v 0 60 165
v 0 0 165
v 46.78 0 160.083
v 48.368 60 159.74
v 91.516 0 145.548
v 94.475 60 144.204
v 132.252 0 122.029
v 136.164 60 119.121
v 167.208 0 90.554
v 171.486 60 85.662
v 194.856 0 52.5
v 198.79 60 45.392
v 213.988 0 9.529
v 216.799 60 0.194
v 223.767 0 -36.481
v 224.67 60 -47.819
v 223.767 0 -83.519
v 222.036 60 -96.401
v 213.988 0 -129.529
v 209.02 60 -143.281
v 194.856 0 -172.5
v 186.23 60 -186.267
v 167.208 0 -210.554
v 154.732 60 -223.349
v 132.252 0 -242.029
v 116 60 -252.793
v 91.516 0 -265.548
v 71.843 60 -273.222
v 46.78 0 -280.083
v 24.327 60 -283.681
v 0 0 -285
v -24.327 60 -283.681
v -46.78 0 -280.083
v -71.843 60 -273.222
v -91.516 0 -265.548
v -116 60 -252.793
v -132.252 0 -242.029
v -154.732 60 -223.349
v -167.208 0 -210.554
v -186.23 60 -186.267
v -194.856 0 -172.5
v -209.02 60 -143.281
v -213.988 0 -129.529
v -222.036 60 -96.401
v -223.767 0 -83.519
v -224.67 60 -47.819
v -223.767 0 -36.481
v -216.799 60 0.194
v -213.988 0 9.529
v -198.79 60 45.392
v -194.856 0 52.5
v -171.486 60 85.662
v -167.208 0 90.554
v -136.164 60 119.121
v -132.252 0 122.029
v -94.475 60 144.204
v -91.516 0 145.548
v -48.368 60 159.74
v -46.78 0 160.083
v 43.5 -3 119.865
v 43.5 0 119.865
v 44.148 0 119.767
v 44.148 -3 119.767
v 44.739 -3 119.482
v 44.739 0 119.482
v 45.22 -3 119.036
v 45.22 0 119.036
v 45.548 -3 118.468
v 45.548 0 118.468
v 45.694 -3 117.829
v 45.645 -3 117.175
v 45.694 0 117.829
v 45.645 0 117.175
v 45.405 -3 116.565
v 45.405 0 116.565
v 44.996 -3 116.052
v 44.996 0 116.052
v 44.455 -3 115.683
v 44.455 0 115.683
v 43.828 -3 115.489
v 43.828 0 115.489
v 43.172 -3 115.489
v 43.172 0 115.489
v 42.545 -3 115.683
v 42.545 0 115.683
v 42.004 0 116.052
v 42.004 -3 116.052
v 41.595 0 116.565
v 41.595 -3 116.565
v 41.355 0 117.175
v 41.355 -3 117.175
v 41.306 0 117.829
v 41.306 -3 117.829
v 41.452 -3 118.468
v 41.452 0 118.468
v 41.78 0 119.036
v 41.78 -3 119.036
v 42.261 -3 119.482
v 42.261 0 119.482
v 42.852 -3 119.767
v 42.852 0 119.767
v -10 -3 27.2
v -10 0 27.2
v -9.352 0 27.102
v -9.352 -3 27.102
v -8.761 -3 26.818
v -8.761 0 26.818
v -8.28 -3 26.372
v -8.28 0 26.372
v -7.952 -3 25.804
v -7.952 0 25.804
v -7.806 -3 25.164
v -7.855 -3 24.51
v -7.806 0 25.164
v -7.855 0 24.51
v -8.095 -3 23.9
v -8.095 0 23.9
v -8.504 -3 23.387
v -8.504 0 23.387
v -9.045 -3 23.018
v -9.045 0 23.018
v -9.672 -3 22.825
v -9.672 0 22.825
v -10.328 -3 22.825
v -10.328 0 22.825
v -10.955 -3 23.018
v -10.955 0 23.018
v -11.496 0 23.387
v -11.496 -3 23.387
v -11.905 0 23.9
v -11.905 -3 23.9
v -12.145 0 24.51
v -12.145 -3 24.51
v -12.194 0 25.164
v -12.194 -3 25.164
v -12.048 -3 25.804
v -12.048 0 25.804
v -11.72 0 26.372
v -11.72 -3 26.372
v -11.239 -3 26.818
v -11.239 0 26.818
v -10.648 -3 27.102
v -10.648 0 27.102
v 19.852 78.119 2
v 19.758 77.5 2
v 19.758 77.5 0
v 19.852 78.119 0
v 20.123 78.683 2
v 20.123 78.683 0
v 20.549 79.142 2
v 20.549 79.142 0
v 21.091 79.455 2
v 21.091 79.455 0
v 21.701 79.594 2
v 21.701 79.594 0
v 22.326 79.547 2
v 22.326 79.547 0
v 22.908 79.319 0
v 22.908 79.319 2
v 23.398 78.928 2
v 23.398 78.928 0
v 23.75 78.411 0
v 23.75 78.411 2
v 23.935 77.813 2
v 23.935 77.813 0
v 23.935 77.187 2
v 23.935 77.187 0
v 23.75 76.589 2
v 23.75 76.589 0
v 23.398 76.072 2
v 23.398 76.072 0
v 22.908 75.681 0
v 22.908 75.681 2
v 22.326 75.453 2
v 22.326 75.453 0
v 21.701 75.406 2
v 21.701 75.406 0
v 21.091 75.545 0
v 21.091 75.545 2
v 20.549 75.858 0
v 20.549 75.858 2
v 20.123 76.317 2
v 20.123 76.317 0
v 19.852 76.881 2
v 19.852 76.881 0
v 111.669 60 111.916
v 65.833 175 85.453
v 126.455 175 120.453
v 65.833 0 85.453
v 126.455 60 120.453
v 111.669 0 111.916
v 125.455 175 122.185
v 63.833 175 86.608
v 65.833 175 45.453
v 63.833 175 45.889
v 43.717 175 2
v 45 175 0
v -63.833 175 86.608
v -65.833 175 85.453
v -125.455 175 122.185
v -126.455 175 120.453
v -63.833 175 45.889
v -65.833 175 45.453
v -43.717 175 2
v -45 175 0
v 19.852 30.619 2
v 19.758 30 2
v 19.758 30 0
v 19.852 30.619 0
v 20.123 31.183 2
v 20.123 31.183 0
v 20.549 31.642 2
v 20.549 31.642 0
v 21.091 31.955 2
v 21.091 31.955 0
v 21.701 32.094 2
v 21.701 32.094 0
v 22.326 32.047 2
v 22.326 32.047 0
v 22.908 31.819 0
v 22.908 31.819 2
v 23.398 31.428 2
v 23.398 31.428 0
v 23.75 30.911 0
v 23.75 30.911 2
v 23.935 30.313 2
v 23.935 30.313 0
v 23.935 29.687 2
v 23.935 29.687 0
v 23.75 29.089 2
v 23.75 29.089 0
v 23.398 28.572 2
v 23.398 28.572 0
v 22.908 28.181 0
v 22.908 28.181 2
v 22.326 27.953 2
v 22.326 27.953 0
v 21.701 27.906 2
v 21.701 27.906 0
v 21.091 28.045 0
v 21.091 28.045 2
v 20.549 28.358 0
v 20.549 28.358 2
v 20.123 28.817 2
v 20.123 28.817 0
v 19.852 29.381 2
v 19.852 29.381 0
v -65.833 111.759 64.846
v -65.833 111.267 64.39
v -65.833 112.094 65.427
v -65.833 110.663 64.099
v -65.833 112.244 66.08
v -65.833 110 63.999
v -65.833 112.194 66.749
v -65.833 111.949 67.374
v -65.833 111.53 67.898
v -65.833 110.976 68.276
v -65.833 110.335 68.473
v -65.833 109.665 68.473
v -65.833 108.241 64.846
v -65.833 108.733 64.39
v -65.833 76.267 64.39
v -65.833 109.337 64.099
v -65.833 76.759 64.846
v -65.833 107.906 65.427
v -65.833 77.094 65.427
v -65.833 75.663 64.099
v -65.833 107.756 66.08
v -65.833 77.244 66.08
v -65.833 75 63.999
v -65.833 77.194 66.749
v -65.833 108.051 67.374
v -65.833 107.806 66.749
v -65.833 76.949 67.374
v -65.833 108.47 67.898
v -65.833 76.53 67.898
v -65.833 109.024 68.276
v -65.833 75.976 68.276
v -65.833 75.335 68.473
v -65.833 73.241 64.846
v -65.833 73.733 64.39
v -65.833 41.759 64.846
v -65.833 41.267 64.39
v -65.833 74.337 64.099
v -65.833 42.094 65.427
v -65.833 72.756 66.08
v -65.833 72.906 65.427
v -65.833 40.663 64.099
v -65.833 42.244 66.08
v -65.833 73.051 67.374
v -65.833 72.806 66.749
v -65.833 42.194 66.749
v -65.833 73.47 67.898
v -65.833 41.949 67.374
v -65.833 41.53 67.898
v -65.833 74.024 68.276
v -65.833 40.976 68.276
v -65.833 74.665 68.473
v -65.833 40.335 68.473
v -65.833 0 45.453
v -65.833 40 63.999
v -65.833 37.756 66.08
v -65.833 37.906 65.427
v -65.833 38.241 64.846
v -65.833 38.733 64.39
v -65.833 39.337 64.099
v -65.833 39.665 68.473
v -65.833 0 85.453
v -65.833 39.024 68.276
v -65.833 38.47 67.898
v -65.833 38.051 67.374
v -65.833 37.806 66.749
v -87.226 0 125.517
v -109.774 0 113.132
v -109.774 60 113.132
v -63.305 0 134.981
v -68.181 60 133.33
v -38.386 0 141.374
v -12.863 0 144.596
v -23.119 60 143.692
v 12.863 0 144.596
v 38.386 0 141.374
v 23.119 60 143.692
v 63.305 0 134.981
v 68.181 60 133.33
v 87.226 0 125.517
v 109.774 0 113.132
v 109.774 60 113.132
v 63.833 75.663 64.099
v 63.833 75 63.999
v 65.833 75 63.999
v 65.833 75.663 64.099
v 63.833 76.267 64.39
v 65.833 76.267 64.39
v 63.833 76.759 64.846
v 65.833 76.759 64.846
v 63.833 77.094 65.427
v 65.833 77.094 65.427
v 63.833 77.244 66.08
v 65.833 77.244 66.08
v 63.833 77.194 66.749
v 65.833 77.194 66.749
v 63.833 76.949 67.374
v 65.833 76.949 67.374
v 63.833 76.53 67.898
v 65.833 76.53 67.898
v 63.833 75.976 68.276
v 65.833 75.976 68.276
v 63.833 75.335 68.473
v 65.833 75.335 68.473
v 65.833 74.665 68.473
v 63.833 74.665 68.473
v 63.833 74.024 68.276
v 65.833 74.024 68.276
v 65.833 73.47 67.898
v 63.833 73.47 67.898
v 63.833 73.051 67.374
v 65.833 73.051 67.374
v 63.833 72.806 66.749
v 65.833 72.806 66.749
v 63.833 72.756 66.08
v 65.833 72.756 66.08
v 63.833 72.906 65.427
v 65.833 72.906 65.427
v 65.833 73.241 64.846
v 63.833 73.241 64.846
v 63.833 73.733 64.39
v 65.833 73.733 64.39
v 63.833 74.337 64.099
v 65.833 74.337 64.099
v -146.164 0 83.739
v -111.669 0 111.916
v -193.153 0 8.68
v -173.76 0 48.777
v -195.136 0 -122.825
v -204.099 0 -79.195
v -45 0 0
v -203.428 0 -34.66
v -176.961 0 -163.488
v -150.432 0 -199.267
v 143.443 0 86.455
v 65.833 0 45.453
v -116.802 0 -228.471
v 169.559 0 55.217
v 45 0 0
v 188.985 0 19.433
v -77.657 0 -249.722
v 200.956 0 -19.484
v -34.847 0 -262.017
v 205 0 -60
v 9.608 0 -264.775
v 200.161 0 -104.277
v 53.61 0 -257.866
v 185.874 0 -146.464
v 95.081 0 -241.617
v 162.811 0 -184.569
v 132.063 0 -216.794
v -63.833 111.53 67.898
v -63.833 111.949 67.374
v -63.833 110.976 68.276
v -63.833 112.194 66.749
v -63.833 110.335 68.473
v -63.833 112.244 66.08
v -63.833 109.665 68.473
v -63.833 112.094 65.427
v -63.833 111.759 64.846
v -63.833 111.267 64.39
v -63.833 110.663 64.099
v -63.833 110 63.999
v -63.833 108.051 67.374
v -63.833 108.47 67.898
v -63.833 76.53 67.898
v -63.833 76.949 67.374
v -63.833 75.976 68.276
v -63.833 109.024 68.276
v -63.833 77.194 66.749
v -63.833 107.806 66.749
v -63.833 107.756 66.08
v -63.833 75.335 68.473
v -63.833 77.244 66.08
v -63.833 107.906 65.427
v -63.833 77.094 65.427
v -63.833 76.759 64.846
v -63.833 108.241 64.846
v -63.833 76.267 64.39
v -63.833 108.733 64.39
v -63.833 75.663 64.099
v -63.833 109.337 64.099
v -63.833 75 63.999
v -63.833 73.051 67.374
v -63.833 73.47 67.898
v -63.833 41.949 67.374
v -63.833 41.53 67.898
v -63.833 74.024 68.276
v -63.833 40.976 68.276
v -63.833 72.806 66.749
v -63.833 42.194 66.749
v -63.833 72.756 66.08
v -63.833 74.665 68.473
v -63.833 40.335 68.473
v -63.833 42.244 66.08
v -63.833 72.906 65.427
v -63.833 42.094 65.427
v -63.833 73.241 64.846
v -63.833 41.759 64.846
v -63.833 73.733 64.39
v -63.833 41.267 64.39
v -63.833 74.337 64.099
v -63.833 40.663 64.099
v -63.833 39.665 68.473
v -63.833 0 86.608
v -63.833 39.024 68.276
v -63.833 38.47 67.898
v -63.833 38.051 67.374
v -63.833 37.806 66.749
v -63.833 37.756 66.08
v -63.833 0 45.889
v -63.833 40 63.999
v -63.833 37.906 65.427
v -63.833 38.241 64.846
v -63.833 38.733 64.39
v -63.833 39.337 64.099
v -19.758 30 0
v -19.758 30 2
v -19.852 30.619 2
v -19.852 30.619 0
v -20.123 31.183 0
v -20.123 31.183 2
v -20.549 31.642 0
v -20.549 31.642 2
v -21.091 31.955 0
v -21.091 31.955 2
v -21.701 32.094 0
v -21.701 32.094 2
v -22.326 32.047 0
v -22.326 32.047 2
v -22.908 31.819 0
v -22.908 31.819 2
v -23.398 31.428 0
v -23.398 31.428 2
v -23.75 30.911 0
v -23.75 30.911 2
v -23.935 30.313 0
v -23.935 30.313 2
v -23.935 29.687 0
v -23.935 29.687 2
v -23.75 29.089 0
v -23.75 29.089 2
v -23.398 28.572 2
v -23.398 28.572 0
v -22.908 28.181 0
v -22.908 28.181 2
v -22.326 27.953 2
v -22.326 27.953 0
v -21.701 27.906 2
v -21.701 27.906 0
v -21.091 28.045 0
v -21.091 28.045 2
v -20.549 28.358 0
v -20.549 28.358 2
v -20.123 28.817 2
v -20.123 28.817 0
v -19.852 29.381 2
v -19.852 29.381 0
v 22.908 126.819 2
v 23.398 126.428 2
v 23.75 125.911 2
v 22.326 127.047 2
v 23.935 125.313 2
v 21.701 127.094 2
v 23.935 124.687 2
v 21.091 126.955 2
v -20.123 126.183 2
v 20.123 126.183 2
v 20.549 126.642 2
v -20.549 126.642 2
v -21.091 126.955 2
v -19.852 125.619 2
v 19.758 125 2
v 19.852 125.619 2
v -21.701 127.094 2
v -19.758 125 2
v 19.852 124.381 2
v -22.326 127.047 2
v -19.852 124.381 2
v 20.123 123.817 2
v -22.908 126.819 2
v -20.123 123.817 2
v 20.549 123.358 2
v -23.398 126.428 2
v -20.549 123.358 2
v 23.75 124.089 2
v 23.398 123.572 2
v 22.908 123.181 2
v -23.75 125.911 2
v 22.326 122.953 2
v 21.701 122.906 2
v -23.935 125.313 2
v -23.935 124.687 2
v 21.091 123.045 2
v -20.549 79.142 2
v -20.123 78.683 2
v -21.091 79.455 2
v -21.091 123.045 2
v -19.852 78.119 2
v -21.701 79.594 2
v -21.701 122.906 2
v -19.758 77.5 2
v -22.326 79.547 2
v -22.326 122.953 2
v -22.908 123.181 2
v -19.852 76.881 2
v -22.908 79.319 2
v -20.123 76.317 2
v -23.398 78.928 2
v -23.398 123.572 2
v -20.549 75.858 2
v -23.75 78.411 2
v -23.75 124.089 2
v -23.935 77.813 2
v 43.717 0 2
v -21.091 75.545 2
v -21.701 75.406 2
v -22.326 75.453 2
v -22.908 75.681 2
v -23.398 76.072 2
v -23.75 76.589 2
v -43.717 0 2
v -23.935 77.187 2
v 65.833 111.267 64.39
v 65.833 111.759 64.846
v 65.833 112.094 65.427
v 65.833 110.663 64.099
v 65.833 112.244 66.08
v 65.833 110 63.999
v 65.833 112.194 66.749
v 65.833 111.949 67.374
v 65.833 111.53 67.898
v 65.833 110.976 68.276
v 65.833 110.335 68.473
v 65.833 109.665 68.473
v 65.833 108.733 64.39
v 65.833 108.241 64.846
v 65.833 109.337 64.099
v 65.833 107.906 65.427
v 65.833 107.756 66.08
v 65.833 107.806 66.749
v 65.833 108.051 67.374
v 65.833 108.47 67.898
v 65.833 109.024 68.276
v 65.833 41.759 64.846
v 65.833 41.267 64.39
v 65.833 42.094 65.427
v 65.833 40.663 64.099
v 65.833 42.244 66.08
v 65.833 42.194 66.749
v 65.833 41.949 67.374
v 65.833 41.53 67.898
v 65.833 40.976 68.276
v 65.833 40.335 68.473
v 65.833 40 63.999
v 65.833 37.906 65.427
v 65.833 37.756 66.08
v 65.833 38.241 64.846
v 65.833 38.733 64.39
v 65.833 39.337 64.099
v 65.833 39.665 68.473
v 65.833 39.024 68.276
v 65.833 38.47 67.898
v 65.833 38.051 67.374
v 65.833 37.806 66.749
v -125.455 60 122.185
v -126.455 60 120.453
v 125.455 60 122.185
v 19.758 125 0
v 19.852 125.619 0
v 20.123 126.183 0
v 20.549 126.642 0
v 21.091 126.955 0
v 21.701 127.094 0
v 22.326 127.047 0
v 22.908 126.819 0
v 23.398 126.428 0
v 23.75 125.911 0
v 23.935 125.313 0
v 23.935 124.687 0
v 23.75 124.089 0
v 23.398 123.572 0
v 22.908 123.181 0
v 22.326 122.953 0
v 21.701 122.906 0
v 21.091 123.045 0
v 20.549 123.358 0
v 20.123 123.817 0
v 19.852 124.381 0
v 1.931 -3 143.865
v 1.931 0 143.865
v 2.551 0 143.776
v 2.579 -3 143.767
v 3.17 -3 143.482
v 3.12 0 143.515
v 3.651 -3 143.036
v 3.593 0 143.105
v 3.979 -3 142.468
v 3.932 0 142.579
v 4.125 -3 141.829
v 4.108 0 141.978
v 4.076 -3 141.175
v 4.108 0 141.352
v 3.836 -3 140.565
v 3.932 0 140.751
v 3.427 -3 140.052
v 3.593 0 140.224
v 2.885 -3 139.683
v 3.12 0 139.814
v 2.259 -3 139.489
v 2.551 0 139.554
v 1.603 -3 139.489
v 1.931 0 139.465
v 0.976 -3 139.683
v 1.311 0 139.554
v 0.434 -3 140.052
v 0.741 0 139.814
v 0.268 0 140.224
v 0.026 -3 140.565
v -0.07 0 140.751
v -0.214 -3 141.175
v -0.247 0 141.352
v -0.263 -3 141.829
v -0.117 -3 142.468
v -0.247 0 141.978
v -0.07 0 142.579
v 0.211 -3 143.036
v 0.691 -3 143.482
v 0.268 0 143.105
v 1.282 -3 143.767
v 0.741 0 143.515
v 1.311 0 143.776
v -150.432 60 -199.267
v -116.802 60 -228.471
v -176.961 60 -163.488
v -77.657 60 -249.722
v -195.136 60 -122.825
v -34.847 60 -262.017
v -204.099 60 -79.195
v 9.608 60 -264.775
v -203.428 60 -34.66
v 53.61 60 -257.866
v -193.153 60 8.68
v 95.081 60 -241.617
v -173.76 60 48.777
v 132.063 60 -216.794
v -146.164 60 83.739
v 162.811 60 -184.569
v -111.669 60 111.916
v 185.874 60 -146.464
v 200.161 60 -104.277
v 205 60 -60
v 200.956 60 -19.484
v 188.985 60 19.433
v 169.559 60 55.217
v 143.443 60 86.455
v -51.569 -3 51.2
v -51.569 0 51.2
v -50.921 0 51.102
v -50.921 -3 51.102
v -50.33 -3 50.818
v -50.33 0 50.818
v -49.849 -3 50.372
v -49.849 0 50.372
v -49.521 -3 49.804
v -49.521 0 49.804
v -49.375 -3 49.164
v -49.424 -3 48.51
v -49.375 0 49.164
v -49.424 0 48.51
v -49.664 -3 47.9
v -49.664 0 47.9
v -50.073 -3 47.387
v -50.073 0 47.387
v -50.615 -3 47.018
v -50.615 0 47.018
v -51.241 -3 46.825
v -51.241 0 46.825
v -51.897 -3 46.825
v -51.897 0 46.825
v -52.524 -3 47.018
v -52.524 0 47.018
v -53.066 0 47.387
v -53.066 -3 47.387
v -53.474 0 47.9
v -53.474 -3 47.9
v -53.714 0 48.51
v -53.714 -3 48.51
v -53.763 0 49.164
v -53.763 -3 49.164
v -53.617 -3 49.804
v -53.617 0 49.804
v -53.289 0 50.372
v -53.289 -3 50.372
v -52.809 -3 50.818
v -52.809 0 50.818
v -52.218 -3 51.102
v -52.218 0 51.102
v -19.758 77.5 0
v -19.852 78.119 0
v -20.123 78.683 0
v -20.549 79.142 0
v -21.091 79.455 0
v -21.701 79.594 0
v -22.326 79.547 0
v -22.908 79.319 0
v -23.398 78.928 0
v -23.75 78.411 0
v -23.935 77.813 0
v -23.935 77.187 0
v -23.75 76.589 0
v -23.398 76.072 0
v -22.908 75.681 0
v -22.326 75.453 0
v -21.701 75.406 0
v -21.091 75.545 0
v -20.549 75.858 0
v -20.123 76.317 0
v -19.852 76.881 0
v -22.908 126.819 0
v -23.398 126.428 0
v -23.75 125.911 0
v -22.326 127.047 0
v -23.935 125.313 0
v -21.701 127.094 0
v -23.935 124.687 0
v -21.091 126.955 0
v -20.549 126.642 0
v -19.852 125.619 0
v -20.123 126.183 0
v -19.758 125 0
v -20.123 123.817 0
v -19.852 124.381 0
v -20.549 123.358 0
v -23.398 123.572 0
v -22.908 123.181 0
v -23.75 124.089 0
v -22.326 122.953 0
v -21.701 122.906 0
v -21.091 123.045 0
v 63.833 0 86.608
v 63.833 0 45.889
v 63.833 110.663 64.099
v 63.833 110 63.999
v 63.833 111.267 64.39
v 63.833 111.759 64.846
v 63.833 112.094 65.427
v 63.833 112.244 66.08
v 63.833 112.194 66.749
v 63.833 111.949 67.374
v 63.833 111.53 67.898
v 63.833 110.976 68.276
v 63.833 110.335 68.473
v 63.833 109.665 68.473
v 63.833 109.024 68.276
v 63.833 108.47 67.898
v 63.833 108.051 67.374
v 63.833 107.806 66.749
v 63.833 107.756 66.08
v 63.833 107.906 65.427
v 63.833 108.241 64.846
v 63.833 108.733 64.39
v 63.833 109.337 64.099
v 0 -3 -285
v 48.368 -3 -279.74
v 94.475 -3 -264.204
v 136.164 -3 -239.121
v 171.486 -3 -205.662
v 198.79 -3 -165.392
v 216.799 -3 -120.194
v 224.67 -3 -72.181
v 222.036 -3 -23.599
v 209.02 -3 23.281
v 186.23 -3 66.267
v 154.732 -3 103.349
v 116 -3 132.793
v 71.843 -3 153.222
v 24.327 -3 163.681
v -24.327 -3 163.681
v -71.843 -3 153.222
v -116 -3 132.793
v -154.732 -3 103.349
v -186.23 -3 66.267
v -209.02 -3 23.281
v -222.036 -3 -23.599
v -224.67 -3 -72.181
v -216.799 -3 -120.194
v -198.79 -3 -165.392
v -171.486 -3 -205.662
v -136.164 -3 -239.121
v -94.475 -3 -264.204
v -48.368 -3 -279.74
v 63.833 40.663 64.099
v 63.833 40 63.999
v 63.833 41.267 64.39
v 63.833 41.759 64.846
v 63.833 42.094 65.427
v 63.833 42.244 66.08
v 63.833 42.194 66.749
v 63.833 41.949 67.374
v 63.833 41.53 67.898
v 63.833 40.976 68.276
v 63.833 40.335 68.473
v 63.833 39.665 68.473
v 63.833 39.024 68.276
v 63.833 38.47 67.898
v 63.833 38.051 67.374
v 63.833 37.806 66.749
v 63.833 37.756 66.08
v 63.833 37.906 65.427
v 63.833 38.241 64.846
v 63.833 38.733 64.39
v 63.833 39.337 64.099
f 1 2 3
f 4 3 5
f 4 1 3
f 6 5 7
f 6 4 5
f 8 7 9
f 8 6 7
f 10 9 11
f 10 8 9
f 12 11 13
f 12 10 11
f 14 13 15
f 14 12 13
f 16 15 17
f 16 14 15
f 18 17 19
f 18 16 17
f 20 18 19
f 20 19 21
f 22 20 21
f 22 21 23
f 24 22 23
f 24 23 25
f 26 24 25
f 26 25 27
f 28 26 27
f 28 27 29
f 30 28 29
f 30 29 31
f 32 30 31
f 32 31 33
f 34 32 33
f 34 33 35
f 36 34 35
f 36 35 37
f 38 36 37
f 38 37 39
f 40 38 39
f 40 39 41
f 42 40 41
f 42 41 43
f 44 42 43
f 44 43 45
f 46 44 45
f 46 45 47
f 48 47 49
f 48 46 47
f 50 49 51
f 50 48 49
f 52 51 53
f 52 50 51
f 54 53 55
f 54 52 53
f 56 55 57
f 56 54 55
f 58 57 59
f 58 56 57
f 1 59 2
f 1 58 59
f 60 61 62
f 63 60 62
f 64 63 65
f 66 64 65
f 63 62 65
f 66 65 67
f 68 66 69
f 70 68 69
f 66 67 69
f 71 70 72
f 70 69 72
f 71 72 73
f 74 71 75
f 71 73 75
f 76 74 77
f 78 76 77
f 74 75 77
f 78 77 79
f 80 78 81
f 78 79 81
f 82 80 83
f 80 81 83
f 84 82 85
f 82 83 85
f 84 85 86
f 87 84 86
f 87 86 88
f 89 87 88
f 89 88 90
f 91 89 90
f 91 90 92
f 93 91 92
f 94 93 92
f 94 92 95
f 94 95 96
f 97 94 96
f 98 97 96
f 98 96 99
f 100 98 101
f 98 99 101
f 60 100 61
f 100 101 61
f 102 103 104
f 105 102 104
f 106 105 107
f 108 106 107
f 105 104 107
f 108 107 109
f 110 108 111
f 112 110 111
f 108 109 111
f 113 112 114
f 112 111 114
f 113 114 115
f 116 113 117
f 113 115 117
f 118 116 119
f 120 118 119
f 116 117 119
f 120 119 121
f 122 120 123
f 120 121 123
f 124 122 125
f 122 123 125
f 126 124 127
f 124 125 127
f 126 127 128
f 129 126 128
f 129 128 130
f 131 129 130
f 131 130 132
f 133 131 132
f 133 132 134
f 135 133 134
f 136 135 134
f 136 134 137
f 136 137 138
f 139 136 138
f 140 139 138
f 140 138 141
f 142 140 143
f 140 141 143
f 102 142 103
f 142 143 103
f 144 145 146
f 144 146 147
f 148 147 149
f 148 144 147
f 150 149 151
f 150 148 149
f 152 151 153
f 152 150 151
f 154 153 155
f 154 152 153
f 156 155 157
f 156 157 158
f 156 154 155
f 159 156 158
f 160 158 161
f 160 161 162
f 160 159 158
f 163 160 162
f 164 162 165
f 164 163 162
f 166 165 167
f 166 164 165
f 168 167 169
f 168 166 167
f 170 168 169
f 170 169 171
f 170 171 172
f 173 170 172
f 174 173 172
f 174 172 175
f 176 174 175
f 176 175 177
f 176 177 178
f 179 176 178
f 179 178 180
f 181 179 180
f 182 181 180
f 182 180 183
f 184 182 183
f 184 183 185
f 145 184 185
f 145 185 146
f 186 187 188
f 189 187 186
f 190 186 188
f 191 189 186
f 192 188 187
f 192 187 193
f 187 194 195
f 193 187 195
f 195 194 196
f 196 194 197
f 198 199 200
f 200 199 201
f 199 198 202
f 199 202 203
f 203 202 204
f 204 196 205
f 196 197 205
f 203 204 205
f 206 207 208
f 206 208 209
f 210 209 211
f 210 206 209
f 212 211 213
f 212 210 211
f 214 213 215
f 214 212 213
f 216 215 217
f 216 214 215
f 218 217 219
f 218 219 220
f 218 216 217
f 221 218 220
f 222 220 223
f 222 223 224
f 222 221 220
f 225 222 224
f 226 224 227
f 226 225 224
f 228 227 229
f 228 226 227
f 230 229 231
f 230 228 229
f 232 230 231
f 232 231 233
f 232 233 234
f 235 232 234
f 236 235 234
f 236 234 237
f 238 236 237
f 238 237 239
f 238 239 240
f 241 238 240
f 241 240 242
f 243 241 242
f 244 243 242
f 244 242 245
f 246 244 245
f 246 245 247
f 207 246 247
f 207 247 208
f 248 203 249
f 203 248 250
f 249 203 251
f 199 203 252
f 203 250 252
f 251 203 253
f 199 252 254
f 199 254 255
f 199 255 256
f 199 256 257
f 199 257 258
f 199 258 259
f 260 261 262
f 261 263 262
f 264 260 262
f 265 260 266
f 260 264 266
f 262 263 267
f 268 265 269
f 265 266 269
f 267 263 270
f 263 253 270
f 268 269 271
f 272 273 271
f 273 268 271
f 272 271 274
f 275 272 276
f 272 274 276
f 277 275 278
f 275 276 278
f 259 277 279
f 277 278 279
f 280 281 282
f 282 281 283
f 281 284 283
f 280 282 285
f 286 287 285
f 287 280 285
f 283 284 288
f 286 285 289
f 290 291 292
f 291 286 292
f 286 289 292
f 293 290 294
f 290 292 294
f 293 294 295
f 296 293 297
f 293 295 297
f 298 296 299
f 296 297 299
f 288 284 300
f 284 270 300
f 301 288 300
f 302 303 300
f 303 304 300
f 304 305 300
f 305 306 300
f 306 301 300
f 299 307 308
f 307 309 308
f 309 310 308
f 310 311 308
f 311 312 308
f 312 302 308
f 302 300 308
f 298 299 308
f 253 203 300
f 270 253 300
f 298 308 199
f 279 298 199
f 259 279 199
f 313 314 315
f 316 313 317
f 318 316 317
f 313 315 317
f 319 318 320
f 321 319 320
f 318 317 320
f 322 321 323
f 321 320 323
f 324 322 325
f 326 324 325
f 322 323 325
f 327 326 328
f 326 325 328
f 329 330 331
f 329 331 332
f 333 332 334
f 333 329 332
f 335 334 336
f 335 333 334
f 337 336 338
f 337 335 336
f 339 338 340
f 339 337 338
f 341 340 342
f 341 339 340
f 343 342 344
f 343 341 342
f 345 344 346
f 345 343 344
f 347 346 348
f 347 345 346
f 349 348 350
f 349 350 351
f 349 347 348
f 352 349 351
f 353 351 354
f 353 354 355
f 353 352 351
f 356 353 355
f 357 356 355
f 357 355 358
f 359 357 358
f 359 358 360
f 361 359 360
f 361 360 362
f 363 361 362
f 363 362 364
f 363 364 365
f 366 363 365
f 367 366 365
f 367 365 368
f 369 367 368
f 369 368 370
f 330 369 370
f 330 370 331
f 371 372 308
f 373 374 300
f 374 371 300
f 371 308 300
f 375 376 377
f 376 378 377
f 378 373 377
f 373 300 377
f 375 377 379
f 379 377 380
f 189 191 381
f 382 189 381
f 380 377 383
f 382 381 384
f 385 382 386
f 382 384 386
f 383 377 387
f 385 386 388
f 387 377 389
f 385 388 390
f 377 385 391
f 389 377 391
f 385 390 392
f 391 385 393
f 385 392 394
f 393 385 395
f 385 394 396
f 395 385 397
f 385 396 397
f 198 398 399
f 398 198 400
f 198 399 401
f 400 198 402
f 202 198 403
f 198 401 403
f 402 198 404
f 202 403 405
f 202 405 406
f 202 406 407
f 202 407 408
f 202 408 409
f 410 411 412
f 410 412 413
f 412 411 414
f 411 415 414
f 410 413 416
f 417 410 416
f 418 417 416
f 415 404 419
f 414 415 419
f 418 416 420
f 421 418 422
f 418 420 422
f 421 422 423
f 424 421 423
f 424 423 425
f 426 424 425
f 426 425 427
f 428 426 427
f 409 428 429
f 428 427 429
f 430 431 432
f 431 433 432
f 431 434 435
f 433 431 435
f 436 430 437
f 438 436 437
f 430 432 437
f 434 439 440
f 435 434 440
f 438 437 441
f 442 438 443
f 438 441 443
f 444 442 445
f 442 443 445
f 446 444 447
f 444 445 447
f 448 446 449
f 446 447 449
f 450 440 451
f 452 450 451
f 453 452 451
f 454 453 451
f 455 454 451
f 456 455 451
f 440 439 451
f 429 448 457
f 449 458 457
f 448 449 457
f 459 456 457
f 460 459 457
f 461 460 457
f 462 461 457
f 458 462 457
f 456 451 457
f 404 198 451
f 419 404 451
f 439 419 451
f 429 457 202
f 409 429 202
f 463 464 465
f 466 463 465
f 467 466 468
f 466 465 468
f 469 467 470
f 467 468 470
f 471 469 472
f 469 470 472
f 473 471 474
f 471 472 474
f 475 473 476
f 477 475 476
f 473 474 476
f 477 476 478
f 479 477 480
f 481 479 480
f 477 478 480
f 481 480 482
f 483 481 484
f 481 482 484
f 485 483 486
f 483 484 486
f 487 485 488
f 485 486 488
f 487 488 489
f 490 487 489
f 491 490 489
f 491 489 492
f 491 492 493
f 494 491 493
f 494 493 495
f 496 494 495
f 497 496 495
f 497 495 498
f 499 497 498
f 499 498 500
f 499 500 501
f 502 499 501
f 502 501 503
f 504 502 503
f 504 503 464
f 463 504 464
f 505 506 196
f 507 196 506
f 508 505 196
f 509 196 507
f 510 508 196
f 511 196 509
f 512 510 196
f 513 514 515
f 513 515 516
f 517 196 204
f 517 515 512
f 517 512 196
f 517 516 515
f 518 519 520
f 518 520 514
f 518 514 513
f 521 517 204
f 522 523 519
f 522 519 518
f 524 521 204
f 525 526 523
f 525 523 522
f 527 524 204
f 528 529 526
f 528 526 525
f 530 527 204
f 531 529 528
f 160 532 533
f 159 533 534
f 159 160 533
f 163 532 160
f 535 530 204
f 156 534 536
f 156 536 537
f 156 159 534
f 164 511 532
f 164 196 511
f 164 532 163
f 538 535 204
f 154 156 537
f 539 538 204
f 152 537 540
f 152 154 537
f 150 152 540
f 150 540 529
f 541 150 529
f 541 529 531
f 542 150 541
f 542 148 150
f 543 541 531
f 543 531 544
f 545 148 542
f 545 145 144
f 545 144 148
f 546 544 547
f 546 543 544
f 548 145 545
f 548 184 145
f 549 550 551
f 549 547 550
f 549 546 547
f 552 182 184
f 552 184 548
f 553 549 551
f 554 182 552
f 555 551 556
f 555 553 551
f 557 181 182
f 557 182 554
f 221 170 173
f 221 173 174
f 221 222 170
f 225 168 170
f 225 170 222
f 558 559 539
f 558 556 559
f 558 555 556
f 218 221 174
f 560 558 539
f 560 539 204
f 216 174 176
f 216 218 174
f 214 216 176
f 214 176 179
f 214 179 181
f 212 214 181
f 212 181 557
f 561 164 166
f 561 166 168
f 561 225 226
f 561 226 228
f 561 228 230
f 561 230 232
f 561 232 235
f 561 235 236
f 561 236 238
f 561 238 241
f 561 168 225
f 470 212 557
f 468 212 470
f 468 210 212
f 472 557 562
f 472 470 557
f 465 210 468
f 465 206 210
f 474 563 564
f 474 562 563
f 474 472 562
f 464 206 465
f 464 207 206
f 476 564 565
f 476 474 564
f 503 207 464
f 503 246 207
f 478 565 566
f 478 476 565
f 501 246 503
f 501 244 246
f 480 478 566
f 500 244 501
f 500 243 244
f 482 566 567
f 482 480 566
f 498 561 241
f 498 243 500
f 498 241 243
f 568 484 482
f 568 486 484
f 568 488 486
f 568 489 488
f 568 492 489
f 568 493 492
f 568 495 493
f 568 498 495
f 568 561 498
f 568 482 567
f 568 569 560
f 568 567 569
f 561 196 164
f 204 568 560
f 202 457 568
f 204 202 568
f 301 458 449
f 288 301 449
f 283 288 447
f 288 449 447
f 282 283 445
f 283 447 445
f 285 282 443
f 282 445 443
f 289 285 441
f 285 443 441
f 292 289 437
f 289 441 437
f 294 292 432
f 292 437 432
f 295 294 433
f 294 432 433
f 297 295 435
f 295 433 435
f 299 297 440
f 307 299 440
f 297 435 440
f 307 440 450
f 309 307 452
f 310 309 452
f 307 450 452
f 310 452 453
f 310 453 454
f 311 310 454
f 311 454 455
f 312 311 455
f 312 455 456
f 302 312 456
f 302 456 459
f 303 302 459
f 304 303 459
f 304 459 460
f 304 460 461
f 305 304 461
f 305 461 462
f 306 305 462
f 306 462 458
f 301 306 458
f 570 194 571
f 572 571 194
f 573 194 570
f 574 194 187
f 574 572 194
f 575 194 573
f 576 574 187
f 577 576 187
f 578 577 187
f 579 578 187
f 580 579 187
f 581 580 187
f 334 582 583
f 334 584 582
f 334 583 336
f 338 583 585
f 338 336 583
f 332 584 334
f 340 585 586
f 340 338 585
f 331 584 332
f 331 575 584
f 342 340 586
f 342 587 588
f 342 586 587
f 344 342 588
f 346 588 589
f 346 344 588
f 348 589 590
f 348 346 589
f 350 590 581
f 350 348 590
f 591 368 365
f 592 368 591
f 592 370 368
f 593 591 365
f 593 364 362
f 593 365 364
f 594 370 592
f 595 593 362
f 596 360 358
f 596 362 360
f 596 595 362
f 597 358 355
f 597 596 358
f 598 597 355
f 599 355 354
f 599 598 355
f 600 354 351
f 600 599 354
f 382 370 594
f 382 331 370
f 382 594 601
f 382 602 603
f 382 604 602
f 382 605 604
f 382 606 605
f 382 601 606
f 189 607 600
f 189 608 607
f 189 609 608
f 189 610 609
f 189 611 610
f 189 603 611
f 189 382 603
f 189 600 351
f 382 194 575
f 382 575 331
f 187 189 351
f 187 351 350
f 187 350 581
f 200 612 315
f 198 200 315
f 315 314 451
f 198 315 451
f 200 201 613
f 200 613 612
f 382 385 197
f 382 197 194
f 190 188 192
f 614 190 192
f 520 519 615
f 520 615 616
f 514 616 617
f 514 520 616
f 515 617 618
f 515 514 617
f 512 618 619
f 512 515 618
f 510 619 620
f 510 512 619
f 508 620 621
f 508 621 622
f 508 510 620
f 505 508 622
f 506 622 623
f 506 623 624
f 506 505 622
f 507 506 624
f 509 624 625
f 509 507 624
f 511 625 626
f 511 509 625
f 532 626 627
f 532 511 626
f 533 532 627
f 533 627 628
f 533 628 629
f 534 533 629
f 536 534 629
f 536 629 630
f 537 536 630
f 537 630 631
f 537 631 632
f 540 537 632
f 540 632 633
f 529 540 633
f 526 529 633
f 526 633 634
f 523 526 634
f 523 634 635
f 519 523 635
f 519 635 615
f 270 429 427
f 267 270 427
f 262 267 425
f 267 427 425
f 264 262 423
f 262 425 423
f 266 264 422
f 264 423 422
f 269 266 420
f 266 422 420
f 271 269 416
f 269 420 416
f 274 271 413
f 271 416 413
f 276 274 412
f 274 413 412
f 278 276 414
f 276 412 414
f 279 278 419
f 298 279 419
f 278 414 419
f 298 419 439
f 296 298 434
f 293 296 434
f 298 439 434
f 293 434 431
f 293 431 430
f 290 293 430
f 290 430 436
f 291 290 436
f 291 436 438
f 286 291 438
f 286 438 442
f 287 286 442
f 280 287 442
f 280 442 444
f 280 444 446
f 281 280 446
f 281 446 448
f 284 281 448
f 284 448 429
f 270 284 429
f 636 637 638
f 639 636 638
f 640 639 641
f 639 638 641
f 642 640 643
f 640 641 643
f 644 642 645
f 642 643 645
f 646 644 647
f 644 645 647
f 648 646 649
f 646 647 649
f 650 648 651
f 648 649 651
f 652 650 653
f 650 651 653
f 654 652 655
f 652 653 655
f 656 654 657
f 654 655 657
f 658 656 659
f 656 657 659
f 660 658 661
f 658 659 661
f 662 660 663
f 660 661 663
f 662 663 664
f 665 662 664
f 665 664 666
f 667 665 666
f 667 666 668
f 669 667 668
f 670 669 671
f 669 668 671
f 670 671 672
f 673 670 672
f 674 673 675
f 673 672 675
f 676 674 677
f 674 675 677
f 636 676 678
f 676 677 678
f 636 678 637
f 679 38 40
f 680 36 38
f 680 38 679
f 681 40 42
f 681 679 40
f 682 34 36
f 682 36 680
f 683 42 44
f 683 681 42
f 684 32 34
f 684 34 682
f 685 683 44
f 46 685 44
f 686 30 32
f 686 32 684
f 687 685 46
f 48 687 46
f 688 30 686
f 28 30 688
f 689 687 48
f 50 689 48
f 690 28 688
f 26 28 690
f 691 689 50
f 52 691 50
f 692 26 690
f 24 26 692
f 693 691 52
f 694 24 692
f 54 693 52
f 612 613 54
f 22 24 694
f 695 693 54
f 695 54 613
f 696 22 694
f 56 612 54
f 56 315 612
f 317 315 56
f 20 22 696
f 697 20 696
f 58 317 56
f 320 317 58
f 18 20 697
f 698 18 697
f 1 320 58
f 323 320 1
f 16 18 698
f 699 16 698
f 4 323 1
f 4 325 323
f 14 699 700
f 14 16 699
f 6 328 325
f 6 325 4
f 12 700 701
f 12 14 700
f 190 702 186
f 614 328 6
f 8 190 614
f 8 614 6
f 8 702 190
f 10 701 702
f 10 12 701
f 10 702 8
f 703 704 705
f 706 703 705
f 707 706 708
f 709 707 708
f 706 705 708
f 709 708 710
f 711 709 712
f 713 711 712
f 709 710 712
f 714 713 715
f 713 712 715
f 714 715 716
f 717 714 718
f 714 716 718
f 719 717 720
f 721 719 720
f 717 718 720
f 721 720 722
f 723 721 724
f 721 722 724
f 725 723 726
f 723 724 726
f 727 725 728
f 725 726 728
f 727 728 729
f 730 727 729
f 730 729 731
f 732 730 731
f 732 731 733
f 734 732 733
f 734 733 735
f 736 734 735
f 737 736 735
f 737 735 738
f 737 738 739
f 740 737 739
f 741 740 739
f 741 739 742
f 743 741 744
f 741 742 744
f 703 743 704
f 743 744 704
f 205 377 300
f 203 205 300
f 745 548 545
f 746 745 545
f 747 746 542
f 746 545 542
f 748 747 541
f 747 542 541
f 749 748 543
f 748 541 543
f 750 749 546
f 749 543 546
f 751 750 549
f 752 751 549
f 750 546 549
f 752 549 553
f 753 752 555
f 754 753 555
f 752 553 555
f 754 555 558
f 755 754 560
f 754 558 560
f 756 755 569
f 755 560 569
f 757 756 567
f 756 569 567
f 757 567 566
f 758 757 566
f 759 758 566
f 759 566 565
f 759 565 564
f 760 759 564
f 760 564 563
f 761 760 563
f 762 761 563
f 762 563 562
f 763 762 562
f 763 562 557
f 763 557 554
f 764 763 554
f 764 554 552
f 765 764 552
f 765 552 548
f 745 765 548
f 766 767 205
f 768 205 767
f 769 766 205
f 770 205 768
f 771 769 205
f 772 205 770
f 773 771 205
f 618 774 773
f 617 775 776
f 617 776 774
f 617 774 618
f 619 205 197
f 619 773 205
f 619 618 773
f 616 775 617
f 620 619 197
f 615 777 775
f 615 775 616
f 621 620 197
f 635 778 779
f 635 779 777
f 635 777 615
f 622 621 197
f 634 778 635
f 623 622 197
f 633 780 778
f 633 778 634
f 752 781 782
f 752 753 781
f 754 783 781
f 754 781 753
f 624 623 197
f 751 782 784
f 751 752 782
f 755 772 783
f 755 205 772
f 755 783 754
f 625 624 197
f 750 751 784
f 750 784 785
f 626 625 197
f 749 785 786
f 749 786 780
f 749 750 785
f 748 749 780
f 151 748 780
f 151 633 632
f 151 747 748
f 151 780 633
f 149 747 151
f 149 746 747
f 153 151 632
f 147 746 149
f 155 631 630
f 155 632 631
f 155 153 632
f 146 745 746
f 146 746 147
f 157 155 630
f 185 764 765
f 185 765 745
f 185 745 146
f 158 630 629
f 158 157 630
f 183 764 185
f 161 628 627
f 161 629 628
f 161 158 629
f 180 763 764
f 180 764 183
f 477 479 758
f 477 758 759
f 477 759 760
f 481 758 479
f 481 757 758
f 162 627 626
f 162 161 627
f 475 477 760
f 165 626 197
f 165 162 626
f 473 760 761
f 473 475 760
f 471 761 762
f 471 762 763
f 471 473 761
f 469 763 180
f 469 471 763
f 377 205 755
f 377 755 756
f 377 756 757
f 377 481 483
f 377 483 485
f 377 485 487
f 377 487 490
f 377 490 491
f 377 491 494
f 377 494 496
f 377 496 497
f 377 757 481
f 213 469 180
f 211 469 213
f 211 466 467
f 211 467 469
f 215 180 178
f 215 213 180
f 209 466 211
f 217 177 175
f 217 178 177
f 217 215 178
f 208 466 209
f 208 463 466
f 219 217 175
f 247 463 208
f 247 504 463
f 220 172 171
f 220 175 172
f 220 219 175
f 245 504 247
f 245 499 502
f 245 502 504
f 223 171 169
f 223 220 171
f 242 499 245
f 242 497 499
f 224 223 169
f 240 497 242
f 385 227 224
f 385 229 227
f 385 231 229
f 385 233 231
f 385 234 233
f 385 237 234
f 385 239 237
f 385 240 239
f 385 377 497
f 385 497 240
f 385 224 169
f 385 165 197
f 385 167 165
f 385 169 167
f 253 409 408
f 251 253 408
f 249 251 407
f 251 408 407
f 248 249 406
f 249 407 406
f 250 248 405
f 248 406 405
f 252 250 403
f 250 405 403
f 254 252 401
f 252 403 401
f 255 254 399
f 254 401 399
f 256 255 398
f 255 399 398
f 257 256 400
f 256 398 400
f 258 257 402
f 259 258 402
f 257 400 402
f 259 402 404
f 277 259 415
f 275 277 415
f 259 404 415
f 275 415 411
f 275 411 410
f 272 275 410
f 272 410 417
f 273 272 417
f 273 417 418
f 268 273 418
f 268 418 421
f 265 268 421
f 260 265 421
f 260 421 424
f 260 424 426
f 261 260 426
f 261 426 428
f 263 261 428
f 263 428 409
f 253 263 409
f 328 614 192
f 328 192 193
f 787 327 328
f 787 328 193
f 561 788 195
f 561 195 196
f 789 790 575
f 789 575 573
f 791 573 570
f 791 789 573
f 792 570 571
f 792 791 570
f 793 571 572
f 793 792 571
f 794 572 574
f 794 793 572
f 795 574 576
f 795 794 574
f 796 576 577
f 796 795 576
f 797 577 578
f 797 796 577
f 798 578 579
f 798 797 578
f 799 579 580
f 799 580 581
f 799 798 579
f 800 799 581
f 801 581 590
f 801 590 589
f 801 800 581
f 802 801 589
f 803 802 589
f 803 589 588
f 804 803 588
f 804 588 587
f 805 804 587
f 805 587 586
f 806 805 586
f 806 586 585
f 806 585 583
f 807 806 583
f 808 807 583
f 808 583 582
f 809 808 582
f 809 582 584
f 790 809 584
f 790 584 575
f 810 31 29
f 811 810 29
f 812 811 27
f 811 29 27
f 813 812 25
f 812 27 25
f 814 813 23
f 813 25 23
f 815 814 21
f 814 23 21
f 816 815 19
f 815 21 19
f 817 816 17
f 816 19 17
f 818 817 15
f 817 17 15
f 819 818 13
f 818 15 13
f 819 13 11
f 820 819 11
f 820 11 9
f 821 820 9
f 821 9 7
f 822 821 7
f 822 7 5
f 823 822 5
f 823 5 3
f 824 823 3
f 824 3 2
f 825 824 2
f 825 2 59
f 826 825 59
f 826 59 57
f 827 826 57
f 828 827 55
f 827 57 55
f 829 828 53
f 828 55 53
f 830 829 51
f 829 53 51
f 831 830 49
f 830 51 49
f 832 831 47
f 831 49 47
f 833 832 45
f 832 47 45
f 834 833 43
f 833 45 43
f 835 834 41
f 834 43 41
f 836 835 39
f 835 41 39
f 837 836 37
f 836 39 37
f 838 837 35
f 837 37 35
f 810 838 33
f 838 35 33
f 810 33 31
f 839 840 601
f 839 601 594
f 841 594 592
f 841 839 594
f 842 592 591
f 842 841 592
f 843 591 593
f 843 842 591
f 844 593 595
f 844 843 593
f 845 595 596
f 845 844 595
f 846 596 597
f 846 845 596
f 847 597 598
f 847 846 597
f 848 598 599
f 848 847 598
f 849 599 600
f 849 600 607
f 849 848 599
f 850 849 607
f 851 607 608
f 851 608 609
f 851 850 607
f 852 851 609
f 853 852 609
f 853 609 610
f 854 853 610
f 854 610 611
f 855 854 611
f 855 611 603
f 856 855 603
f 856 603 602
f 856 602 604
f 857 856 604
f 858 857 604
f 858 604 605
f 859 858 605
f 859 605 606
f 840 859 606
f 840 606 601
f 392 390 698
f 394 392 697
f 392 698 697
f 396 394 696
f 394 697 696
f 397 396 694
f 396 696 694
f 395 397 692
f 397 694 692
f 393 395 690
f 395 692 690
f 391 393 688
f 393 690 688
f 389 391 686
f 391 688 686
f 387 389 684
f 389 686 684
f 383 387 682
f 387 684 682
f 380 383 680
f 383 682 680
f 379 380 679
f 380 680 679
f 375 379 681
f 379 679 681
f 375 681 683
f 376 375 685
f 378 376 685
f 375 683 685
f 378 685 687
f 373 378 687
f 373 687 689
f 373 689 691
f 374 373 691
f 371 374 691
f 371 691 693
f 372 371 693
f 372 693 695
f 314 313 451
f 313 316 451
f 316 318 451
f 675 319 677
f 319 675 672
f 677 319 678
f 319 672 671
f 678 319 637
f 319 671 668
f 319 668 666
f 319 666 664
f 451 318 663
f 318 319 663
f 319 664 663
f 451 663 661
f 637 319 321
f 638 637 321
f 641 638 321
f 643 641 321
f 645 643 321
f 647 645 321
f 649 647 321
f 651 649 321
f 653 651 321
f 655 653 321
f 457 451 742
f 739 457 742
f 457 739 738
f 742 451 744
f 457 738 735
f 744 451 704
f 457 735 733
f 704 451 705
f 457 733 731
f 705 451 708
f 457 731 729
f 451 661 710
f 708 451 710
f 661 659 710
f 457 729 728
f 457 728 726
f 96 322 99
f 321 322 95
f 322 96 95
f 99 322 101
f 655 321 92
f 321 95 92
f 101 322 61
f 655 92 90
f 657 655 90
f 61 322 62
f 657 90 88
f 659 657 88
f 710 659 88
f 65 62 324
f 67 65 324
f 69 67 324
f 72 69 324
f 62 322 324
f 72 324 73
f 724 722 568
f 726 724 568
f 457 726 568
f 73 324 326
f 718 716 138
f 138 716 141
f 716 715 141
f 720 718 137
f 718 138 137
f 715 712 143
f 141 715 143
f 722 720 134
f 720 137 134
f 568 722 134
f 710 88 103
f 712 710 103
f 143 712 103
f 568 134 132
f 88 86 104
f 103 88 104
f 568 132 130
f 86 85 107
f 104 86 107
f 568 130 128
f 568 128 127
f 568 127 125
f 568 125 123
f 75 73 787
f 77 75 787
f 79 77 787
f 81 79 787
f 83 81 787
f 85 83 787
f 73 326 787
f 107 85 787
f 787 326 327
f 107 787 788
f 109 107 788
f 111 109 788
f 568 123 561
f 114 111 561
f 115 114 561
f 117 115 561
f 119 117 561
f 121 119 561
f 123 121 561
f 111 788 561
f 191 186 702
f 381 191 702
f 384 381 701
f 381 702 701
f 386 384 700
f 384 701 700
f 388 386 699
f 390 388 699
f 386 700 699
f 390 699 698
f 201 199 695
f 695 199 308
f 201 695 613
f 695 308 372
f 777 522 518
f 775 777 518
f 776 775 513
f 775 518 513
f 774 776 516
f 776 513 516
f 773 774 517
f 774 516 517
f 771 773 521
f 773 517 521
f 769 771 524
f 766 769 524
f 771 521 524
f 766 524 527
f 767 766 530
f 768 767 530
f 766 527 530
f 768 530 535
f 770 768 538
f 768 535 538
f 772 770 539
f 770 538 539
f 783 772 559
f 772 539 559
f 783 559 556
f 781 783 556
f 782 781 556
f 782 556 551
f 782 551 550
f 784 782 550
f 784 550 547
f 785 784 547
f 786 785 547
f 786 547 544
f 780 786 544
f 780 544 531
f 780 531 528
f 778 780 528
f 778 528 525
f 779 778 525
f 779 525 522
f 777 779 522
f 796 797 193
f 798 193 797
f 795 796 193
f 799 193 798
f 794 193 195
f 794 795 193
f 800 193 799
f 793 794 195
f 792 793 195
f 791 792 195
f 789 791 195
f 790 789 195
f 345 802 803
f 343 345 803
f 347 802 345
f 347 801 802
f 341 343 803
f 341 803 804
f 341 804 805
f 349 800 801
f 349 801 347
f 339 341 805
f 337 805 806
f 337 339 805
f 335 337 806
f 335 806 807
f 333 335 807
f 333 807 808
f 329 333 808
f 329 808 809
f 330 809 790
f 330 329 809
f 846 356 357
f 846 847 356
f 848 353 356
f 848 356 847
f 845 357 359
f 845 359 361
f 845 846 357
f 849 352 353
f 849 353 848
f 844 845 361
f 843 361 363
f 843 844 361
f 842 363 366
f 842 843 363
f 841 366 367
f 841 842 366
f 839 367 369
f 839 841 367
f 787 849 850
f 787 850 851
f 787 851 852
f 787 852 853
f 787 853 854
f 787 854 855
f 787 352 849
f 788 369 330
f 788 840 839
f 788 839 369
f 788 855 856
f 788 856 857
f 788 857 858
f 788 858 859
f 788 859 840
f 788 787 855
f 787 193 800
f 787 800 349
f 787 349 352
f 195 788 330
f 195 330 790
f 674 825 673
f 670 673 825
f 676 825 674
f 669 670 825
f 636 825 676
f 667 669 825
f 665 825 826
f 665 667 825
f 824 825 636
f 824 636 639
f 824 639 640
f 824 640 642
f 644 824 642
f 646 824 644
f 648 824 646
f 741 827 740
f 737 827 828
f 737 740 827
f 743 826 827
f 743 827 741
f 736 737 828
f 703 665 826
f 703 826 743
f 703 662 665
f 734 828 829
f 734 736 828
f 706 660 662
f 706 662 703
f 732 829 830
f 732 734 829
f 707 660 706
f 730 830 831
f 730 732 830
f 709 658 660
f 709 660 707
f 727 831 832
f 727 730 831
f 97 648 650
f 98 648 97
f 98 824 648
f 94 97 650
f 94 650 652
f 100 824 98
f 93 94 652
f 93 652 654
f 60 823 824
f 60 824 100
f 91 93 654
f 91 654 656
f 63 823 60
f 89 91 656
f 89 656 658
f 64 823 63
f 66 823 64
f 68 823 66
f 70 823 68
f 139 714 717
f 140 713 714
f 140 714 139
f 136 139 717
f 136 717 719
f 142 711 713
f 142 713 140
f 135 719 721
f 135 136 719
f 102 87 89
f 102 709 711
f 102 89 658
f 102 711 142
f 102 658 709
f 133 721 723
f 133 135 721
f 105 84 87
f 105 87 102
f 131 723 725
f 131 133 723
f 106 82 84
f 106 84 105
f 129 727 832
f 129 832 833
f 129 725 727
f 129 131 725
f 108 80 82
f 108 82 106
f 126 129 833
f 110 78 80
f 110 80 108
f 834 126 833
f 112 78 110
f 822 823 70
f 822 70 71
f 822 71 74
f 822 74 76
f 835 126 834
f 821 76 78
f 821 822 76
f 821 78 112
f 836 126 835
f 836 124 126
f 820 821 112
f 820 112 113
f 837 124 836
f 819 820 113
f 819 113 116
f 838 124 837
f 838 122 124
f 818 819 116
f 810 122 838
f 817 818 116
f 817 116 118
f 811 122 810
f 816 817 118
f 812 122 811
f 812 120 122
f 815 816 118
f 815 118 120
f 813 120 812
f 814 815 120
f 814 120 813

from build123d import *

# Parameters (mm, degrees)
EXTRUDE_THIN1_DEPTH = 175
CUT_EXTRUDE1_REACH  = 249.104
SKETCH2_R           = 2.1
CUT_EXTRUDE2_REACH  = 224.775
SKETCH3_R           = 2.25
SKETCH4_R           = 225
BOSS_EXTRUDE1_DEPTH = 3
SKETCH5_R           = 2.2
CUT_EXTRUDE3_DEPTH  = 3
BOSS_EXTRUDE2_START = 60
SKETCH6_R           = 225
SKETCH6_R_2         = 205
BOSS_EXTRUDE2_DEPTH = 60


with BuildPart() as part:
    # Sketch1 → Extrude-Thin1 (new body)
    with BuildSketch(Plane(origin=(0, 0, 0), x_dir=(1, 0, 0), z_dir=(0, 1, 0))):
        Polygon((0, 0), (-45, 0), (-65.833333333, -45.452967144), (-65.833333333, -85.452967144), (-126.455111598, -120.452967144), (-125.455111598, -122.185017952), (-63.833333333, -86.607667683), (-63.833333333, -45.889482298), (-43.716622104, -2), (0, -2), align=None)
    extrude_thin1 = extrude(amount=EXTRUDE_THIN1_DEPTH)

    # Sketch2 → Cut-Extrude1 (cut, up to next)
    with BuildSketch(Plane.XY.offset(2), mode=Mode.PRIVATE) as cut_extrude1_sk1:
        with Locations((-21.858311052, 30)):
            Circle(SKETCH2_R)
    cut_extrude1_tool1 = extrude(cut_extrude1_sk1.sketch, amount=-CUT_EXTRUDE1_REACH, mode=Mode.PRIVATE) & part.part
    # Sketch2 → Cut-Extrude1 (cut, up to next)
    with BuildSketch(Plane.XY.offset(2), mode=Mode.PRIVATE) as cut_extrude1_sk2:
        with Locations((-21.858311052, 77.5)):
            Circle(SKETCH2_R)
    cut_extrude1_tool2 = extrude(cut_extrude1_sk2.sketch, amount=-CUT_EXTRUDE1_REACH, mode=Mode.PRIVATE) & part.part
    # Sketch2 → Cut-Extrude1 (cut, up to next)
    with BuildSketch(Plane.XY.offset(2), mode=Mode.PRIVATE) as cut_extrude1_sk3:
        with Locations((-21.858311052, 125)):
            Circle(SKETCH2_R)
    cut_extrude1_tool3 = extrude(cut_extrude1_sk3.sketch, amount=-CUT_EXTRUDE1_REACH, mode=Mode.PRIVATE) & part.part
    cut_extrude1_1 = cut_extrude1_tool1.solids().sort_by_distance((-21.858311, 30, 2))[0]
    add(cut_extrude1_1, mode=Mode.SUBTRACT)
    cut_extrude1_2 = cut_extrude1_tool2.solids().sort_by_distance((-21.858311, 77.5, 2))[0]
    add(cut_extrude1_2, mode=Mode.SUBTRACT)
    cut_extrude1_3 = cut_extrude1_tool3.solids().sort_by_distance((-21.858311, 125, 2))[0]
    add(cut_extrude1_3, mode=Mode.SUBTRACT)
    cut_extrude1 = cut_extrude1_1 + cut_extrude1_2 + cut_extrude1_3  # Cut-Extrude1 as one shape, for the pattern or mirror that repeats it

    # Sketch3 → Cut-Extrude2 (cut, up to next)
    with BuildSketch(Plane(origin=(-63.833333333, 0, 0), x_dir=(0, 0, -1), z_dir=(1, 0, 0)), mode=Mode.PRIVATE) as cut_extrude2_sk1:
        with Locations((-66.248574991, 40)):
            Circle(SKETCH3_R)
    cut_extrude2_tool1 = extrude(cut_extrude2_sk1.sketch, amount=-CUT_EXTRUDE2_REACH, mode=Mode.PRIVATE) & part.part
    # Sketch3 → Cut-Extrude2 (cut, up to next)
    with BuildSketch(Plane(origin=(-63.833333333, 0, 0), x_dir=(0, 0, -1), z_dir=(1, 0, 0)), mode=Mode.PRIVATE) as cut_extrude2_sk2:
        with Locations((-66.248574991, 75)):
            Circle(SKETCH3_R)
    cut_extrude2_tool2 = extrude(cut_extrude2_sk2.sketch, amount=-CUT_EXTRUDE2_REACH, mode=Mode.PRIVATE) & part.part
    # Sketch3 → Cut-Extrude2 (cut, up to next)
    with BuildSketch(Plane(origin=(-63.833333333, 0, 0), x_dir=(0, 0, -1), z_dir=(1, 0, 0)), mode=Mode.PRIVATE) as cut_extrude2_sk3:
        with Locations((-66.248574991, 110)):
            Circle(SKETCH3_R)
    cut_extrude2_tool3 = extrude(cut_extrude2_sk3.sketch, amount=-CUT_EXTRUDE2_REACH, mode=Mode.PRIVATE) & part.part
    cut_extrude2_1 = cut_extrude2_tool1.solids().sort_by_distance((-63.833333, 40, 66.248575))[0]
    add(cut_extrude2_1, mode=Mode.SUBTRACT)
    cut_extrude2_2 = cut_extrude2_tool2.solids().sort_by_distance((-63.833333, 75, 66.248575))[0]
    add(cut_extrude2_2, mode=Mode.SUBTRACT)
    cut_extrude2_3 = cut_extrude2_tool3.solids().sort_by_distance((-63.833333, 110, 66.248575))[0]
    add(cut_extrude2_3, mode=Mode.SUBTRACT)
    cut_extrude2 = cut_extrude2_1 + cut_extrude2_2 + cut_extrude2_3  # Cut-Extrude2 as one shape, for the pattern or mirror that repeats it

    # Mirror1: Extrude-Thin1, Cut-Extrude1, Cut-Extrude2 across plane
    add(extrude_thin1.mirror(Plane(origin=(0, 0, 0), x_dir=(0, 0, 1), z_dir=(1, 0, 0))))
    add(cut_extrude1.mirror(Plane(origin=(0, 0, 0), x_dir=(0, 0, 1), z_dir=(1, 0, 0))), mode=Mode.SUBTRACT)
    add(cut_extrude2.mirror(Plane(origin=(0, 0, 0), x_dir=(0, 0, 1), z_dir=(1, 0, 0))), mode=Mode.SUBTRACT)

    # Sketch4 → Boss-Extrude1 (add)
    with BuildSketch(Plane.XZ):
        with Locations(Location((0, -60, 0), (0, 0, 270))):
            Circle(SKETCH4_R)
    extrude(amount=BOSS_EXTRUDE1_DEPTH)

    # Sketch5 → Cut-Extrude3 (cut)
    with BuildSketch(Plane(origin=(0, 0, 0), x_dir=(1, 0, 0), z_dir=(0, 1, 0))):
        with Locations(Location((-10, -25, 0), (0, 0, 270))):
            Circle(SKETCH5_R)
        with Locations(Location((43.5, -117.664718205, 0), (0, 0, 270))):
            Circle(SKETCH5_R)
        with Locations(Location((1.930780618, -141.664718205, 0), (0, 0, 270))):
            Circle(SKETCH5_R)
        with Locations(Location((-51.569219382, -49, 0), (0, 0, 270))):
            Circle(SKETCH5_R)
    extrude(amount=-CUT_EXTRUDE3_DEPTH, mode=Mode.SUBTRACT)

    # Sketch6 → Boss-Extrude2 (add)
    with BuildSketch(Plane(origin=(0, 0, 0), x_dir=(1, 0, 0), z_dir=(0, 1, 0)).offset(BOSS_EXTRUDE2_START)):
        with Locations(Location((0, 60, 0), (0, 0, 270))):
            Circle(SKETCH6_R)
        with Locations((0, 60)):
            Circle(SKETCH6_R_2, mode=Mode.SUBTRACT)
    extrude(amount=-BOSS_EXTRUDE2_DEPTH)


solid = part.part
